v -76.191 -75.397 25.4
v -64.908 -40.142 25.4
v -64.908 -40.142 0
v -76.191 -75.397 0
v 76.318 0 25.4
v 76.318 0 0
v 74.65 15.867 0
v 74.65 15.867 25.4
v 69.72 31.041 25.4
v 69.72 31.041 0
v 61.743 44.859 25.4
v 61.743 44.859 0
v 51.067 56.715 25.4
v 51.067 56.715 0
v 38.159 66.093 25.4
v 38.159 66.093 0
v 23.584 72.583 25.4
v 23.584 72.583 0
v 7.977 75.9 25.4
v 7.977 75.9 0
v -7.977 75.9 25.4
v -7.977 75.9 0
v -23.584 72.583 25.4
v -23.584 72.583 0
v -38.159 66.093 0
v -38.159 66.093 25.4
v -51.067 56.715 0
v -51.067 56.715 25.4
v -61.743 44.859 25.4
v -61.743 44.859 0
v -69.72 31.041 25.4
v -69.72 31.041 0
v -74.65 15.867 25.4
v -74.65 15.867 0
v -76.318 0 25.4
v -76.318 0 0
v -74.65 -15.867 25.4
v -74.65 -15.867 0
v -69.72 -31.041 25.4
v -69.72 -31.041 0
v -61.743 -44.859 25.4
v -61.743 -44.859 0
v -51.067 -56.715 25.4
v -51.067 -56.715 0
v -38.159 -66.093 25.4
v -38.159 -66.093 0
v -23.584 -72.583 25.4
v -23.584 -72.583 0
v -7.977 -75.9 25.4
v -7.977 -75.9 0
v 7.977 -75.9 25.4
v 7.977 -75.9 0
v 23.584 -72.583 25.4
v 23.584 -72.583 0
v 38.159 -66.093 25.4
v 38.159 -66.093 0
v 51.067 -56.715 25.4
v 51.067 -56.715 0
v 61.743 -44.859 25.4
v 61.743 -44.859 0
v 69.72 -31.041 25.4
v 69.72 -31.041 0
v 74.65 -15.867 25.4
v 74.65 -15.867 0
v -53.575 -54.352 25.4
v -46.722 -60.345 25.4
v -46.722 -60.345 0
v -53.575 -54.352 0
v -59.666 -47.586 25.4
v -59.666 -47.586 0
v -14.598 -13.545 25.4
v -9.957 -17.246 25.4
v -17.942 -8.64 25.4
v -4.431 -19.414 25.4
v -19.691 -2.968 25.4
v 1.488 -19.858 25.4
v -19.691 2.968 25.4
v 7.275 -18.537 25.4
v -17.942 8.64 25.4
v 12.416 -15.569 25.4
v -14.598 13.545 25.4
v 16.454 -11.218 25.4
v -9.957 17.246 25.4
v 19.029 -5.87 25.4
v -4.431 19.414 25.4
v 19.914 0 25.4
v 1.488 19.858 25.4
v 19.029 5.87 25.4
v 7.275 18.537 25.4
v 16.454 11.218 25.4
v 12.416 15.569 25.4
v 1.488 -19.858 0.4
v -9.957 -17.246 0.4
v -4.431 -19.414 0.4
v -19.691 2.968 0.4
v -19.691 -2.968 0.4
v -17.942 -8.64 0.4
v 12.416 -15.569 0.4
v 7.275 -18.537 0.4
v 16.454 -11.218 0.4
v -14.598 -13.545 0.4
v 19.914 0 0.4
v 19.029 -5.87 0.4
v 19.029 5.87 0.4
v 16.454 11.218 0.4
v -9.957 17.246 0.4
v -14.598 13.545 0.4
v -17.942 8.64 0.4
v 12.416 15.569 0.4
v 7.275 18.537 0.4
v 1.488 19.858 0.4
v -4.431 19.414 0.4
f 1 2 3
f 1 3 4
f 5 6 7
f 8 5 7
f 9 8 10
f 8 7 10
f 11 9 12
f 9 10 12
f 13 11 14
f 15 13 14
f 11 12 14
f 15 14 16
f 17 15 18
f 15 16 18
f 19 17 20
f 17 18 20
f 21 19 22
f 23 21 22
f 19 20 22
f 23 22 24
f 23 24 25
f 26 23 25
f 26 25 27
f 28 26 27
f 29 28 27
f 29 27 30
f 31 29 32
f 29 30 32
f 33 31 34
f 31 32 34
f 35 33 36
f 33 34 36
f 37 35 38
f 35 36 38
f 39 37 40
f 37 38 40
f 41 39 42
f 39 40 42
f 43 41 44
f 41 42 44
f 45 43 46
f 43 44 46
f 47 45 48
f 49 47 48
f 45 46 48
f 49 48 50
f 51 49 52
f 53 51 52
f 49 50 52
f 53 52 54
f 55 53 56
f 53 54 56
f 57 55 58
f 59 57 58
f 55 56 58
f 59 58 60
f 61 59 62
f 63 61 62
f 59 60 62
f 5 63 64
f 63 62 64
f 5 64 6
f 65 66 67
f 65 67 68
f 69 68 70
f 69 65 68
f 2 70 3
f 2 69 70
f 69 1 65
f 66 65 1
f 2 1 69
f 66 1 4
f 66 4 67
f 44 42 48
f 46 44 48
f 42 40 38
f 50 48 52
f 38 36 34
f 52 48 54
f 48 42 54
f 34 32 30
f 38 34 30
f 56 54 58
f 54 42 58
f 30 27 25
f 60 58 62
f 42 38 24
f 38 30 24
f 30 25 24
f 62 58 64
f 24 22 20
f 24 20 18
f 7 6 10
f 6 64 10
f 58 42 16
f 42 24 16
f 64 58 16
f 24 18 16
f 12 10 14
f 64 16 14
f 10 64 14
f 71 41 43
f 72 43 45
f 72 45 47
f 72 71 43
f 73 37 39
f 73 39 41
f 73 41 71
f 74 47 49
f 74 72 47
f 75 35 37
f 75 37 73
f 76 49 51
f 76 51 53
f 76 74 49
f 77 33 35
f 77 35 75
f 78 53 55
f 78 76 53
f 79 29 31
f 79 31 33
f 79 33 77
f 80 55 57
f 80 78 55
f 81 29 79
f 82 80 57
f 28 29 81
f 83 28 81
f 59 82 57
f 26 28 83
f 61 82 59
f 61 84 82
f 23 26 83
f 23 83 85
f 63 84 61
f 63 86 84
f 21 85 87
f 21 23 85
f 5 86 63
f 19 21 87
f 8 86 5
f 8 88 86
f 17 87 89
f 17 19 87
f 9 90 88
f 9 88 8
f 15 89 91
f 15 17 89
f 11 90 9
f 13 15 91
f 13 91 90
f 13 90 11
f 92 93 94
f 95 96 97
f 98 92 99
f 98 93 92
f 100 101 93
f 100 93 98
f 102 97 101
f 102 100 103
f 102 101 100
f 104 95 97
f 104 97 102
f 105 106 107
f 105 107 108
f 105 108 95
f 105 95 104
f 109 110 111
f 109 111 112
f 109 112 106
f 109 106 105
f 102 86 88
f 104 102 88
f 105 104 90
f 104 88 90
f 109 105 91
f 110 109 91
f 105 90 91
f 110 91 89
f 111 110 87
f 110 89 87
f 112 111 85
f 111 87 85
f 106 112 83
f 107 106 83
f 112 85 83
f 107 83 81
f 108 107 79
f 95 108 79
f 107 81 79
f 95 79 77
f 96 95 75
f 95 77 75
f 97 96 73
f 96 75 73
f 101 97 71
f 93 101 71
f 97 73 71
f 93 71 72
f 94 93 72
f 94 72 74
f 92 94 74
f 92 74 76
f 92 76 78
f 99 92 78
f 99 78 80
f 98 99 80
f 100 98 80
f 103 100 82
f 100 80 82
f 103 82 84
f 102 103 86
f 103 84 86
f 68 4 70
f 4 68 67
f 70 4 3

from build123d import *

# Parameters (mm, degrees)
F0_R     = 76.318023
F1_DEPTH = 25.4
F3_DEPTH = 25.4
F4_R     = 68.006987
F4_R_2   = 56.078944
F5_DEPTH = 25.4
F6_R     = 19.913777
F7_DEPTH = 25


with BuildPart() as f1:
    # F0 (on Top) → F1 (new body)
    with BuildSketch(Plane.XY):
        Circle(F0_R)
    extrude(amount=F1_DEPTH)

    # F4 (on face) → F5 (join)
    with BuildSketch(Plane.XY.offset(25.4)):
        Circle(F4_R)
        Circle(F4_R_2, mode=Mode.SUBTRACT)
    extrude(amount=-F5_DEPTH)

    # F6 (on face) → F7 (cut)
    with BuildSketch(Plane.XY.offset(25.4)):
        Circle(F6_R)
    extrude(amount=-F7_DEPTH, mode=Mode.SUBTRACT)


with BuildPart() as f3:
    # F2 (on face) → F3 (new body)
    with BuildSketch(Plane.XY.offset(25.4)):
        with BuildLine():
            ThreePointArc((-46.7222, -60.344649), (-56.721674, -51.059694), (-64.90783, -40.142425))
            Line((-64.90783, -40.142425), (-76.190673, -75.397052))
            Line((-76.190673, -75.397052), (-46.7222, -60.344649))
        make_face()
    extrude(amount=-F3_DEPTH)


solid = Compound([f1.part, f3.part])
